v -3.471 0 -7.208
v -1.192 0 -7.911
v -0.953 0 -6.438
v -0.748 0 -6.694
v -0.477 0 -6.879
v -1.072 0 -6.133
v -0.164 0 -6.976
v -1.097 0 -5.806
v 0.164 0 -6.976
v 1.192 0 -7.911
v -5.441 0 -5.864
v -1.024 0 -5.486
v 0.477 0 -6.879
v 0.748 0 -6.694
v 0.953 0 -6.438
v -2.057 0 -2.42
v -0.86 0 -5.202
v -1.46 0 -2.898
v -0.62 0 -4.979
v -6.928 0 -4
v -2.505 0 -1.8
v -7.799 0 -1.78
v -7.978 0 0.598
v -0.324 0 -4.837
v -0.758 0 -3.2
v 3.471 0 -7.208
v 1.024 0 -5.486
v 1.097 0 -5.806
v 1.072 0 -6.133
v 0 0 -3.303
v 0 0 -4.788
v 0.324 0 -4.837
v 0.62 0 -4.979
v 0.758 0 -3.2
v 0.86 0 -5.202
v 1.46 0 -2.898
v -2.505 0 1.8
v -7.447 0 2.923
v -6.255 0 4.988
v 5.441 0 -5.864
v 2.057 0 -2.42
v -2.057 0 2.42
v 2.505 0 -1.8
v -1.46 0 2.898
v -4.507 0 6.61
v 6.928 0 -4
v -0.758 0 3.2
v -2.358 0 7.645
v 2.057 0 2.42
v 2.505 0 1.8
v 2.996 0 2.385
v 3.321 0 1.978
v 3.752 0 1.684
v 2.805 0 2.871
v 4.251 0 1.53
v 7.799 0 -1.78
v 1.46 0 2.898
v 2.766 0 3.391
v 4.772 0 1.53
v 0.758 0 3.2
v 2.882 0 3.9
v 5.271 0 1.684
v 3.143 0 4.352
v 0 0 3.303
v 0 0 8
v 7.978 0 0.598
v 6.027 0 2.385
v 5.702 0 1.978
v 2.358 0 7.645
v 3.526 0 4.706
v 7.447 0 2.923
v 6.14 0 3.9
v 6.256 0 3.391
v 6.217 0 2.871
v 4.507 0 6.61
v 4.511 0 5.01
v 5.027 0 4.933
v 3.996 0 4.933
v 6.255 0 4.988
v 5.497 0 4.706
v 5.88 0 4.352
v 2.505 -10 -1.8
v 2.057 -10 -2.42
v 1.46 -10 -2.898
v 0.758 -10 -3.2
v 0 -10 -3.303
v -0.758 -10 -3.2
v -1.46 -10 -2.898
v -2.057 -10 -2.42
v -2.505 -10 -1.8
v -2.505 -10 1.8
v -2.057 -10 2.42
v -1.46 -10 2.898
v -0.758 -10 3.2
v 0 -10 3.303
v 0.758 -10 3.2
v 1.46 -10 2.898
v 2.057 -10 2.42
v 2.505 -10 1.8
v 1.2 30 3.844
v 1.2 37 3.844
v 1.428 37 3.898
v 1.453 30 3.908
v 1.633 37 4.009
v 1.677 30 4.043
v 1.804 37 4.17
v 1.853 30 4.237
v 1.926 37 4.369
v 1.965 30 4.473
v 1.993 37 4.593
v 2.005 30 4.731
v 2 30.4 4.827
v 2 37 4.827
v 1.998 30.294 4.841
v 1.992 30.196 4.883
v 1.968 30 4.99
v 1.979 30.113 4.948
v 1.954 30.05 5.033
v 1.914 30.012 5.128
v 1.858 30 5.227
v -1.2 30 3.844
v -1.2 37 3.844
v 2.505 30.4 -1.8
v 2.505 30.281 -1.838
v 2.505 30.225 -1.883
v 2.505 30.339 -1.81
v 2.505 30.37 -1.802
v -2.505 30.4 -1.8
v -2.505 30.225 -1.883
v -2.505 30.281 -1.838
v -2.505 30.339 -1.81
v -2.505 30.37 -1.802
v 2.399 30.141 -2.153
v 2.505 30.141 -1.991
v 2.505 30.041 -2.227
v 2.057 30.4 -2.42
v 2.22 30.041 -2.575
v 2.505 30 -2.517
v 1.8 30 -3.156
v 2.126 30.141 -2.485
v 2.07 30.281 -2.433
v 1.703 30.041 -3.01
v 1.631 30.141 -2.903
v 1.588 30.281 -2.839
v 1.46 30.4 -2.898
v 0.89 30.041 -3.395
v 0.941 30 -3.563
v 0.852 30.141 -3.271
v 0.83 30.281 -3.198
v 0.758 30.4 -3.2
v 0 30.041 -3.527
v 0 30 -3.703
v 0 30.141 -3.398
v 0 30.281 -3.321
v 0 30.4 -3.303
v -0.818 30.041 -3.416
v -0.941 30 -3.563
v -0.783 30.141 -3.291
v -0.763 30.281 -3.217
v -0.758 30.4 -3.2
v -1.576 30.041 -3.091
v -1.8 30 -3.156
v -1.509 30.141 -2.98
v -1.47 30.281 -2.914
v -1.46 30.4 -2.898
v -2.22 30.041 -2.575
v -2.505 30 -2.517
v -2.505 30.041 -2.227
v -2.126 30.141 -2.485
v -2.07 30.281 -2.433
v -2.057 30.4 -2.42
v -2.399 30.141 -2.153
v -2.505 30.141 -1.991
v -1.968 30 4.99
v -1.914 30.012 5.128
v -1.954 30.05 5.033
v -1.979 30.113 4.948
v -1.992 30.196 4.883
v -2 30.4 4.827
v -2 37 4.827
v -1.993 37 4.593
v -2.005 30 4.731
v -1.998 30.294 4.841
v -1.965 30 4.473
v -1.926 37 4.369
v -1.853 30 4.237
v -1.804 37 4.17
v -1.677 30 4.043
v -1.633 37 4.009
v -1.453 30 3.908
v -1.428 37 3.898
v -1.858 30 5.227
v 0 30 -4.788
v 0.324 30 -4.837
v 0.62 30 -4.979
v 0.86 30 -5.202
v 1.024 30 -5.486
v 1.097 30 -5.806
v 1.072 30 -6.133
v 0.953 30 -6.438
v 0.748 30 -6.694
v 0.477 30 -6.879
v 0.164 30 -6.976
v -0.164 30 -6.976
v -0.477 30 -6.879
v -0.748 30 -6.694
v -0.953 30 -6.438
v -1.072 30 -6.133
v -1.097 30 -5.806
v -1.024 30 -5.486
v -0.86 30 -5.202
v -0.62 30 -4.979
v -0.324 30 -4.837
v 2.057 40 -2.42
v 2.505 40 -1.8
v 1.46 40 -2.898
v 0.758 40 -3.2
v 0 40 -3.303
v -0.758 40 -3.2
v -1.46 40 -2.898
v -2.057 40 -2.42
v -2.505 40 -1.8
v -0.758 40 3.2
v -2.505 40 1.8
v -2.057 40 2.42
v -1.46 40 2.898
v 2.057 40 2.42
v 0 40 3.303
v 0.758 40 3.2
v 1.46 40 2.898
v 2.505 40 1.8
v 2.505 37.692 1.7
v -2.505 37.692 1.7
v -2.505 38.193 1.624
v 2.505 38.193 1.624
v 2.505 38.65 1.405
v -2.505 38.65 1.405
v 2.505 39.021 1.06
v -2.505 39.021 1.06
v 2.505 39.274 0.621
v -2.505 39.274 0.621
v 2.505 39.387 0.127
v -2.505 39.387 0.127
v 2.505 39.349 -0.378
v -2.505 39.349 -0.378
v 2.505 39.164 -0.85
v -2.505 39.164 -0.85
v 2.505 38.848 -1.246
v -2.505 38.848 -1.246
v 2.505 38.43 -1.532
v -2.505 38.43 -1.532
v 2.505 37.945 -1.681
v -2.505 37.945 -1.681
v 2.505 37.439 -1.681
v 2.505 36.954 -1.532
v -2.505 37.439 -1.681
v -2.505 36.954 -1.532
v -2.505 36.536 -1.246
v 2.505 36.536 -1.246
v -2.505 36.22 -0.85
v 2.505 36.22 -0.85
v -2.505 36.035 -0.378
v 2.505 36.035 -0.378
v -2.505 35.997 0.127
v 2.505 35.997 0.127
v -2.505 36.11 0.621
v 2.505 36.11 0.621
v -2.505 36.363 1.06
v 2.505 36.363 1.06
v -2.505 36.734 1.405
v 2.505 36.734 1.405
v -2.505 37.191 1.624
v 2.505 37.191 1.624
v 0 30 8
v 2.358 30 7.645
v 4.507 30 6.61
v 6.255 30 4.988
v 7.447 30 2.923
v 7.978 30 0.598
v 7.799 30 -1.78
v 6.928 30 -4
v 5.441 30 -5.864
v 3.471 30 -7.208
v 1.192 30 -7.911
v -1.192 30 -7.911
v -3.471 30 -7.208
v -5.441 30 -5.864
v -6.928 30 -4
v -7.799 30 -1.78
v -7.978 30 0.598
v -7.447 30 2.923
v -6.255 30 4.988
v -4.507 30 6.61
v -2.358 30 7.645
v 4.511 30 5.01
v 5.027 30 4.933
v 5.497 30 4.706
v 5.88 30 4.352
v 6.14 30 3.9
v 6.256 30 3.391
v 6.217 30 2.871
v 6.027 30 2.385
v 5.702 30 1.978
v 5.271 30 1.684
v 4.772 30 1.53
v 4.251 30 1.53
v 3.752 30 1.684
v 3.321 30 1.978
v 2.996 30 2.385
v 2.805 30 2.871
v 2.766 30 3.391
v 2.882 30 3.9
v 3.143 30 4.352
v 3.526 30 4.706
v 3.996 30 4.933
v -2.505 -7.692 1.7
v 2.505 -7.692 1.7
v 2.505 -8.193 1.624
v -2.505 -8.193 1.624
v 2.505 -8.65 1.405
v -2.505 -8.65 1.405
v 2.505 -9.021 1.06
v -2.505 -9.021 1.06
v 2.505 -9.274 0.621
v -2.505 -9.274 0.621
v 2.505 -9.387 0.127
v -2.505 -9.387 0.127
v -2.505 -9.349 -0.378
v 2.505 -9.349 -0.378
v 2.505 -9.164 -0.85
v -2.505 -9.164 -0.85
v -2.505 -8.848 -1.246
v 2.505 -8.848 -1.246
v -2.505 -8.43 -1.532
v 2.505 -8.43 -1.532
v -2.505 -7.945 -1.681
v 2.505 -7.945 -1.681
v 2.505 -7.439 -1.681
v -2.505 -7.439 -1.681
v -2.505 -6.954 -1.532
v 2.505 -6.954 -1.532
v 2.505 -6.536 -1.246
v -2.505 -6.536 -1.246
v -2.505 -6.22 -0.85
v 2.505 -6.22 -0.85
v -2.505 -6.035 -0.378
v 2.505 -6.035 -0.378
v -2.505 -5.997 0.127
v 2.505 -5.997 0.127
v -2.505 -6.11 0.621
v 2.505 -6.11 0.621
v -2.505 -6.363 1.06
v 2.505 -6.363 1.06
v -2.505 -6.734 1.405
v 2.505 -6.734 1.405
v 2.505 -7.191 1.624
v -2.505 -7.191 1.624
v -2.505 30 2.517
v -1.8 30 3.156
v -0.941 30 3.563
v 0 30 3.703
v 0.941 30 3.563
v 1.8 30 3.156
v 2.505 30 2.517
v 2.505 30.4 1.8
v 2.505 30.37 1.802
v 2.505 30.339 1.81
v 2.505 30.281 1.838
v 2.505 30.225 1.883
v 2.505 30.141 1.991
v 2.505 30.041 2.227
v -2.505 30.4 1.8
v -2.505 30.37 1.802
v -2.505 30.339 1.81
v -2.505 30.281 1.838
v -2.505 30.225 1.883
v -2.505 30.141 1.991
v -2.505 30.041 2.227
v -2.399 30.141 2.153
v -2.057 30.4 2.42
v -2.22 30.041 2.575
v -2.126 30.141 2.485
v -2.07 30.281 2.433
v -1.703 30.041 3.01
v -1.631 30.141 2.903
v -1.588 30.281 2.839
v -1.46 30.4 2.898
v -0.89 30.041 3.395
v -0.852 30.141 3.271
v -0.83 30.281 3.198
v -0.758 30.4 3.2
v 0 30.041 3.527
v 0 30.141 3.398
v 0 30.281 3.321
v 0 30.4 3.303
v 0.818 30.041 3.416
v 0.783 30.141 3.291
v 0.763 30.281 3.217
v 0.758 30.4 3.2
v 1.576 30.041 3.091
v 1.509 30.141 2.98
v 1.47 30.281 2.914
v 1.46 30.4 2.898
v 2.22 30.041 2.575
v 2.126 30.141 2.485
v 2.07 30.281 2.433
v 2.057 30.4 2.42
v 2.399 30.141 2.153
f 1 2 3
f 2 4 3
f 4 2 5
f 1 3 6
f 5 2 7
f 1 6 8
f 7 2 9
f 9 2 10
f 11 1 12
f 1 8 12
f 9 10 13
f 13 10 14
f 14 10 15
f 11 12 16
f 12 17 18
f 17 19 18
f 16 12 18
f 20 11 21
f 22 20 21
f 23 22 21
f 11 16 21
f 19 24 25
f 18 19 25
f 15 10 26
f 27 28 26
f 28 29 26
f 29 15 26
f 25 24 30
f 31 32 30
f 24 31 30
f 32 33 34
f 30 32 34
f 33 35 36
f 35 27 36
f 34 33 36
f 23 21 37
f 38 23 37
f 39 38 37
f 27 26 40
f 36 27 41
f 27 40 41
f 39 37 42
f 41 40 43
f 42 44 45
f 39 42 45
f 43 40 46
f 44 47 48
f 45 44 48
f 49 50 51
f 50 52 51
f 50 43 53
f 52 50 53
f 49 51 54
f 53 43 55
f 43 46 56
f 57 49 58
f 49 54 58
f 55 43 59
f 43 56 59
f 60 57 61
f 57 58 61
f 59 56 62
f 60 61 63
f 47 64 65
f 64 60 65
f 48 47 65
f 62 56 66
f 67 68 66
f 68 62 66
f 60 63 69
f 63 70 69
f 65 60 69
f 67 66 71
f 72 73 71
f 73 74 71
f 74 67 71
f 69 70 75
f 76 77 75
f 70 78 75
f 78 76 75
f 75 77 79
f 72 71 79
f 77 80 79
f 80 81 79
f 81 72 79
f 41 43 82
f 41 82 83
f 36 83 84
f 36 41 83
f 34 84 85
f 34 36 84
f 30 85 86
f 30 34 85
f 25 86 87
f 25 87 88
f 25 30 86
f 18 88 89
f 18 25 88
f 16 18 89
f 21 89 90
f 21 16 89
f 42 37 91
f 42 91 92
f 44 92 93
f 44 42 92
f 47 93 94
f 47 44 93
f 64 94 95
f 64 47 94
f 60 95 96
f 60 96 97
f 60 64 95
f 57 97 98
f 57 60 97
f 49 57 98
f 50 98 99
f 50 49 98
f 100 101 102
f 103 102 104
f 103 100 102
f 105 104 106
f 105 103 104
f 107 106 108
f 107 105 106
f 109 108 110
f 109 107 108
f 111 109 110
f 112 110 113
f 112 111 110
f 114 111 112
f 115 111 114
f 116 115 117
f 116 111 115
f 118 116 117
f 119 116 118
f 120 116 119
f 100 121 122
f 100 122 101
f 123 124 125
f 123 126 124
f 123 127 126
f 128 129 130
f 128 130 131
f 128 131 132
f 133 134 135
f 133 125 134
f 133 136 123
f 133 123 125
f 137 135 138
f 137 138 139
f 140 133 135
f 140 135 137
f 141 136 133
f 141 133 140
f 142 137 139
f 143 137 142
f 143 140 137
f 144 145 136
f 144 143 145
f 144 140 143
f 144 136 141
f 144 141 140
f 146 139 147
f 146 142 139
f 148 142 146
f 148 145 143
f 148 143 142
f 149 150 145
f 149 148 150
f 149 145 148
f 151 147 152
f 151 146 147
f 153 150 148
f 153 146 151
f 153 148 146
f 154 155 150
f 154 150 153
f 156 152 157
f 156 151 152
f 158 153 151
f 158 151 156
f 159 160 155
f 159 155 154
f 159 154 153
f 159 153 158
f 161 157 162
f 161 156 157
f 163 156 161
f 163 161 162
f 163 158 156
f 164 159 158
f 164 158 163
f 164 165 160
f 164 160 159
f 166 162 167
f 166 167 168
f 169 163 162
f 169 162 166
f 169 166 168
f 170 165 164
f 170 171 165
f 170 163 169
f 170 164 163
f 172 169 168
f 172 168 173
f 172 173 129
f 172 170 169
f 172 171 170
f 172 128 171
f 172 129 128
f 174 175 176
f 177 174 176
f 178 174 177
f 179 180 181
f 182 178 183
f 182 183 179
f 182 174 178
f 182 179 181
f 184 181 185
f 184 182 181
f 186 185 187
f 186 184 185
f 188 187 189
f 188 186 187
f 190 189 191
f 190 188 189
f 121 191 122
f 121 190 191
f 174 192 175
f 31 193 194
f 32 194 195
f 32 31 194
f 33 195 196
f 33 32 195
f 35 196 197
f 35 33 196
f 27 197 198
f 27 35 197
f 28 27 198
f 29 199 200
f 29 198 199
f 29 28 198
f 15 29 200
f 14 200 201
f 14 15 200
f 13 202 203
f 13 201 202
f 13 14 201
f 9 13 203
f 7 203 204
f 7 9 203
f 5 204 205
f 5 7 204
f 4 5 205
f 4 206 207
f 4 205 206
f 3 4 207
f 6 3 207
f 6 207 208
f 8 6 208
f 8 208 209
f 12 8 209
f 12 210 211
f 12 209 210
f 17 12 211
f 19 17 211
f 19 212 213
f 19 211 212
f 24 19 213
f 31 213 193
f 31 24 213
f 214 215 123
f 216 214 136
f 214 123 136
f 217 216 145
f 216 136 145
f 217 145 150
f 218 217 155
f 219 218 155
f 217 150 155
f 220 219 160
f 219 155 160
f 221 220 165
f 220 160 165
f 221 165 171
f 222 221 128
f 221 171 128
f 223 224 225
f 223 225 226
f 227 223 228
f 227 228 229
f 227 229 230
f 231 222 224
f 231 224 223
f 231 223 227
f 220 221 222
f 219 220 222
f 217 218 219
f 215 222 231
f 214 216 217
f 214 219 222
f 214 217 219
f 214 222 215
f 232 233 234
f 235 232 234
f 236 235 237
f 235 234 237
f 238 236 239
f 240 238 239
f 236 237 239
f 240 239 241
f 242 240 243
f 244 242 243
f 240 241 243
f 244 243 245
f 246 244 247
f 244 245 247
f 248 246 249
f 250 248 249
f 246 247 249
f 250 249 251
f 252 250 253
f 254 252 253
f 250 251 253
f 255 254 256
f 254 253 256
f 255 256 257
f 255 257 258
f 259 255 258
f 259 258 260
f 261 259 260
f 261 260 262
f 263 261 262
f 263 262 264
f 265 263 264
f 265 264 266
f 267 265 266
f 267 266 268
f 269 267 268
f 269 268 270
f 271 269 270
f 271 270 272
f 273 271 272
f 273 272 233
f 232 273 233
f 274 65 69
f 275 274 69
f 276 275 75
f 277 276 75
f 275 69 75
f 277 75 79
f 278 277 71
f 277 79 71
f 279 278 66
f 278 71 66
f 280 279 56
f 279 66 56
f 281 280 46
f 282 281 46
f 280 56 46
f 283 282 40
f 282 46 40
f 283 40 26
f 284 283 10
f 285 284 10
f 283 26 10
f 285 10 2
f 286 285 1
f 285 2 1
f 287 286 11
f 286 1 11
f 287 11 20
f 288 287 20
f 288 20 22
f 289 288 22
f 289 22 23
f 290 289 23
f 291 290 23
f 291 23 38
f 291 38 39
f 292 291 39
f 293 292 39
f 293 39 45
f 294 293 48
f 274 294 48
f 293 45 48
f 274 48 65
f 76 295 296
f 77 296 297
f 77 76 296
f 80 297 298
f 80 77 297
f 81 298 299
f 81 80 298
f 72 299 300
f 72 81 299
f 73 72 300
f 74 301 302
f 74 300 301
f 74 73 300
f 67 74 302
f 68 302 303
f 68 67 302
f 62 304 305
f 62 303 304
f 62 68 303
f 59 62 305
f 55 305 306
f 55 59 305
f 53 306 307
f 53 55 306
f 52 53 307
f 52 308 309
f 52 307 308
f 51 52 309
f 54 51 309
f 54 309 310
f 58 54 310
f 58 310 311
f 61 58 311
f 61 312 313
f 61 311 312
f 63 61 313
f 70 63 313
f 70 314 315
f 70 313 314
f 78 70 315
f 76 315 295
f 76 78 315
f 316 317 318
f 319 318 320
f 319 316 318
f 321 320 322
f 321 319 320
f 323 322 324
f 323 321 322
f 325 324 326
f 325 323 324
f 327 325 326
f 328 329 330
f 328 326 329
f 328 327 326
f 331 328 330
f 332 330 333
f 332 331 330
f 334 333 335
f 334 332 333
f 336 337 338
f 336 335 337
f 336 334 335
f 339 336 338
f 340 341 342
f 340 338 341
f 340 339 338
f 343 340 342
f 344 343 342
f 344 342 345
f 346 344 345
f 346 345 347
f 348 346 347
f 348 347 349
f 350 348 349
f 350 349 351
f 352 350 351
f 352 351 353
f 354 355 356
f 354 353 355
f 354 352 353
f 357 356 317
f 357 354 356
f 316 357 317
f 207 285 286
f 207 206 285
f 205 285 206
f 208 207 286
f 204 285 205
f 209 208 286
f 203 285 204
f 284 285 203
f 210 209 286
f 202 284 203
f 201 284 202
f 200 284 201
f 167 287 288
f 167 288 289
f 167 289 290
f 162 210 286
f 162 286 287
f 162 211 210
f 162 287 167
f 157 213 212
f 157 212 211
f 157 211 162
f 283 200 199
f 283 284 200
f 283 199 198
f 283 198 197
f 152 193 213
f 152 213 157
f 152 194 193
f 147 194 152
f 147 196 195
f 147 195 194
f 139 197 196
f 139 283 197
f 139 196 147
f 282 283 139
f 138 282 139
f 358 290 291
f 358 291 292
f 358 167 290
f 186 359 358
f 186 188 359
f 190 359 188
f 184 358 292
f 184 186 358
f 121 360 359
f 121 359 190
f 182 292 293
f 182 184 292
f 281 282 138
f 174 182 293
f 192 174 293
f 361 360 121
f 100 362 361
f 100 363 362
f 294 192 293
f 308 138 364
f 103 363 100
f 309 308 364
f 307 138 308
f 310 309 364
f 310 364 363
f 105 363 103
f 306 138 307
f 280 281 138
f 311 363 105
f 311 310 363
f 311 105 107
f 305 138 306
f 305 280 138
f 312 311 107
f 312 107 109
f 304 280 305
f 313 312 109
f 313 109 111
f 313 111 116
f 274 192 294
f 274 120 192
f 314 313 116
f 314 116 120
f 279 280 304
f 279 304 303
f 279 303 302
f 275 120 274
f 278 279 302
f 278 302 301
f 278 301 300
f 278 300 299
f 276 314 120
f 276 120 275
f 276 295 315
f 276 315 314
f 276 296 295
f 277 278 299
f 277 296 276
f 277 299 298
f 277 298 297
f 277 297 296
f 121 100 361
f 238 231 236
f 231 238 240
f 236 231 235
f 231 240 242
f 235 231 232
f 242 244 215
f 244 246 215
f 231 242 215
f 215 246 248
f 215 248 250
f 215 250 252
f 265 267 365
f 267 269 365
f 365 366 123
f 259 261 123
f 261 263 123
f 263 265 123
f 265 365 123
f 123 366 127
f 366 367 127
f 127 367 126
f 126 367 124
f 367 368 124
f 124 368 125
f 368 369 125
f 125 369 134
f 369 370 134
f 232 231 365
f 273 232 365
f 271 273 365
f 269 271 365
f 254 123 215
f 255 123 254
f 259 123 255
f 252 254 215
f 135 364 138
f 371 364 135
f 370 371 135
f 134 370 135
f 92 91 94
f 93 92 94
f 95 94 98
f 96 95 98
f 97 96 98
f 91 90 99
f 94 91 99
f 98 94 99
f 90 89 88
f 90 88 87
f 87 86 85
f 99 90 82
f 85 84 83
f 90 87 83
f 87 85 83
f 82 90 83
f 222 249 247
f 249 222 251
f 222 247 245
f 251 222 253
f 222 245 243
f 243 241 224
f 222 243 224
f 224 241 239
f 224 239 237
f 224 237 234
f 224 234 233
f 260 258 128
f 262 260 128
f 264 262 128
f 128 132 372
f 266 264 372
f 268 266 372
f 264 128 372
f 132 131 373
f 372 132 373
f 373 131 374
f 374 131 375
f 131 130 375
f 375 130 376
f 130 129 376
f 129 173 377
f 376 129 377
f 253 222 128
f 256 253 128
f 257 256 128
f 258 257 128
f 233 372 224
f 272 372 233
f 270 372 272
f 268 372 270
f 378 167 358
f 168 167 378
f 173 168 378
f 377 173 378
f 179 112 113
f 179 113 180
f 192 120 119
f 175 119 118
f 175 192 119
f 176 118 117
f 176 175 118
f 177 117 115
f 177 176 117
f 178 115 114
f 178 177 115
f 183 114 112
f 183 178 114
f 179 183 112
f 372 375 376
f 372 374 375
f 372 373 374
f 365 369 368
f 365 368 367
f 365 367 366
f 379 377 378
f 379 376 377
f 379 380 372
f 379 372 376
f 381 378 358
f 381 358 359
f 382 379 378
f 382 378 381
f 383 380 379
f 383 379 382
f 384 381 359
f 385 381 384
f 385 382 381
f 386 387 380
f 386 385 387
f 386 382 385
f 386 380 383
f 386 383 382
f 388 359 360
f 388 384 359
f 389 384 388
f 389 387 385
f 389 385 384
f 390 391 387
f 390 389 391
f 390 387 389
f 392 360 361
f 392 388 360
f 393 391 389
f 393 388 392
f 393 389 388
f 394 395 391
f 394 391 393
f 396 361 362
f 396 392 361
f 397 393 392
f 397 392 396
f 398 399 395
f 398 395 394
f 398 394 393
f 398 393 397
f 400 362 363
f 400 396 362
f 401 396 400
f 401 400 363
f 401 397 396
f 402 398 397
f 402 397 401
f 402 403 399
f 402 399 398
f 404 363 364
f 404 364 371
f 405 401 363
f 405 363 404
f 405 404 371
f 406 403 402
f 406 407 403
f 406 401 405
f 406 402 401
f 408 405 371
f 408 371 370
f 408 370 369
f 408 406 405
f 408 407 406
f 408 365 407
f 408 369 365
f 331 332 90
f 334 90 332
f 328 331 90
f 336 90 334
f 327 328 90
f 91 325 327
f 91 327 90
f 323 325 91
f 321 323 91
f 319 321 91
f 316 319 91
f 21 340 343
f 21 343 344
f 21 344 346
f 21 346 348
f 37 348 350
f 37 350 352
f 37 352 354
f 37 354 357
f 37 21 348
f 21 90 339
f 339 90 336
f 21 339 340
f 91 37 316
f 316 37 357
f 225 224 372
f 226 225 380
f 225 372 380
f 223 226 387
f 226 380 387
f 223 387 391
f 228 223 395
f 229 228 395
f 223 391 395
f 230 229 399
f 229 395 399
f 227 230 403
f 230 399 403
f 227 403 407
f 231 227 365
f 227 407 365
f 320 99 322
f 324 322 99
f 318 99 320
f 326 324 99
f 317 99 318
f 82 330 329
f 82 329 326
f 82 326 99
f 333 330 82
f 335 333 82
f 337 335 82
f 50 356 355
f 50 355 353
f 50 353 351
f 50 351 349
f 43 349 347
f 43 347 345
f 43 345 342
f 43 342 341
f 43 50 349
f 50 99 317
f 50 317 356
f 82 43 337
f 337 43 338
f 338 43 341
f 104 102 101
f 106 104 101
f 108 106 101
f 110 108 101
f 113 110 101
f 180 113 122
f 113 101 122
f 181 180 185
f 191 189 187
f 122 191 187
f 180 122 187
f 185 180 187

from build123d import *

# Parameters (mm, degrees)
SKETCH2_R           = 8
BOSS_EXTRUDE1_DEPTH = 30
BOSS_EXTRUDE3_DEPTH = 10
BOSS_EXTRUDE4_DEPTH = 7
FILLET1_R           = 0.4
SKETCH12_R          = 1.1
SKETCH12_R_2        = 1.75
CUT_EXTRUDE2_DEPTH  = 42.569219478
SKETCH13_R          = 1.7
CUT_EXTRUDE3_DEPTH  = 43.12296985


with BuildPart() as part:
    # Sketch2 → Boss-Extrude1 (new body)
    with BuildSketch(Plane(origin=(0, 0, 0), x_dir=(1, 0, 0), z_dir=(0, 1, 0))):
        with Locations(Location((0, 0, 0), (0, 0, 270))):
            Circle(SKETCH2_R)
    extrude(amount=BOSS_EXTRUDE1_DEPTH)

    # Sketch4 → Boss-Extrude3 (add)
    with BuildSketch(Plane(origin=(0, 30, 0), x_dir=(1, 0, 0), z_dir=(0, 1, 0))):
        with BuildLine():
            Line((2.504502892, -1.8), (2.504502892, 1.8))
            ThreePointArc((2.504502892, 1.8), (0, 3.30267653), (-2.504502892, 1.8))
            Line((-2.504502892, 1.8), (-2.504502892, -1.8))
            ThreePointArc((-2.504502892, -1.8), (0, -3.30267653), (2.504502892, -1.8))
        make_face()
    boss_extrude3 = extrude(amount=BOSS_EXTRUDE3_DEPTH)

    # Sketch8 → Boss-Extrude4 (add)
    with BuildSketch(Plane(origin=(0, 30, 0), x_dir=(1, 0, 0), z_dir=(0, 1, 0))):
        with BuildLine():
            Line((-1.2, -3.84404132), (1.2, -3.84404132))
            ThreePointArc((1.2, -3.84404132), (1.803521194, -4.169699523), (2, -4.826728575))
            Line((2, -4.826728575), (-2, -4.826728575))
            ThreePointArc((-2, -4.826728575), (-1.803521194, -4.169699523), (-1.2, -3.84404132))
        make_face()
    extrude(amount=BOSS_EXTRUDE4_DEPTH)

    # Fillet1
    fillet1_edges = [part.edges().sort_by_distance(p)[0] for p in [
        (0, 30, 4.826728575),
        (0, 30, -3.30267653),
        (0, 30, 3.30267653),
    ]]
    fillet(fillet1_edges, radius=FILLET1_R)

    # Sketch12 → Cut-Extrude2 (cut, through all)
    with BuildSketch(Plane(origin=(0, 0, 0), x_dir=(1, 0, 0), z_dir=(0, 1, 0))):
        with Locations(Location((0, 5.887857779, 0), (0, 0, 270))):
            Circle(SKETCH12_R)
        with Locations(Location((4.511323968, -3.260456868, 0), (0, 0, 270))):
            Circle(SKETCH12_R_2)
    extrude(amount=CUT_EXTRUDE2_DEPTH, mode=Mode.SUBTRACT)

    # Sketch13 → Cut-Extrude3 (cut, through all)
    with BuildSketch(Plane.ZY.offset(2.504502892)):
        with Locations((0, 37.692003777)):
            Circle(SKETCH13_R)
    cut_extrude3 = extrude(amount=-CUT_EXTRUDE3_DEPTH, mode=Mode.SUBTRACT)

    # Mirror1: Boss-Extrude3, Cut-Extrude3 across plane
    add(boss_extrude3.mirror(Plane.ZX.offset(15)))
    add(cut_extrude3.mirror(Plane.ZX.offset(15)), mode=Mode.SUBTRACT)


solid = part.part
